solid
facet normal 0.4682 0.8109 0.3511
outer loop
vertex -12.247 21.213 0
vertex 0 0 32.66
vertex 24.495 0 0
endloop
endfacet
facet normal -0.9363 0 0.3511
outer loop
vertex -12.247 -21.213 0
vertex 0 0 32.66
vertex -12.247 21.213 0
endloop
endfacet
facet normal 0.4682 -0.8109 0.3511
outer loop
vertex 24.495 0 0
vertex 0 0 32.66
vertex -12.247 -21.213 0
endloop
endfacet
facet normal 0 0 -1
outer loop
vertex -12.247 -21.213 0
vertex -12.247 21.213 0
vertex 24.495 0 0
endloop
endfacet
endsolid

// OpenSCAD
ribLength = 40;
cylinder(h = sqrt(2 / 3) * ribLength, r1 = sqrt(6) * ribLength / 4, r2 = 0, $fn = 3);
